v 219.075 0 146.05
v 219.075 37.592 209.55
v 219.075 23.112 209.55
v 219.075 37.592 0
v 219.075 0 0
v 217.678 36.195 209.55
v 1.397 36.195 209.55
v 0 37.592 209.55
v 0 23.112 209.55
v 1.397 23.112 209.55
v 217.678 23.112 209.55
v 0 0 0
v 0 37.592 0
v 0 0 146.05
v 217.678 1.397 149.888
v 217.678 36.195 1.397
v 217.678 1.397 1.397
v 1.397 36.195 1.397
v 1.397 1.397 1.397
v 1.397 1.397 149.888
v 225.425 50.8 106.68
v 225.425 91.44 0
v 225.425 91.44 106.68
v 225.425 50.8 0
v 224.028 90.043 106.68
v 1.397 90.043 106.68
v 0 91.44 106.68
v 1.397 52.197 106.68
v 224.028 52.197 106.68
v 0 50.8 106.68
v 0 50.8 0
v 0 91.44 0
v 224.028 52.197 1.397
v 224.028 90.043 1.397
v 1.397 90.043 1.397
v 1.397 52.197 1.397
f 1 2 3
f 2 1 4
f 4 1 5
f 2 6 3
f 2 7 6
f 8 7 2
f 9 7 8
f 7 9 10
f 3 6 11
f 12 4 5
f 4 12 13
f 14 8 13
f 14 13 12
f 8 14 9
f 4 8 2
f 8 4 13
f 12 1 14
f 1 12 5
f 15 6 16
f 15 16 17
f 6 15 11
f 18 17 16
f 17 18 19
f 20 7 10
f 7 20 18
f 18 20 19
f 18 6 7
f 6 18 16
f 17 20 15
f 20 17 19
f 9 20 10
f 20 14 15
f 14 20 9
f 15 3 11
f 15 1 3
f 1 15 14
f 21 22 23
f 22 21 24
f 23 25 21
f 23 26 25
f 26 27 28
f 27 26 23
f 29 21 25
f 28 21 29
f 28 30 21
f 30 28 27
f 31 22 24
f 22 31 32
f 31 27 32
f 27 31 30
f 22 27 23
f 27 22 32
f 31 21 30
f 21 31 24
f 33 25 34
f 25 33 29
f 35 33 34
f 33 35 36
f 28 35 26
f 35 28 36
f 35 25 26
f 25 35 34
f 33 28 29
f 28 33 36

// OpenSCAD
//
// Make a box suitable for floppy storage.

inch = 25.4; // mm
$fn = 24;

// Wall thickness is shared
wall = 0.055*inch; // 0.06
// Lid parameters
lheight = 4.2*inch;
llength = 8.875*inch;
lwidth = 1.6*inch;
// Base parameters
height = 8.25*inch;
length = 8.625*inch;
width = 1.48*inch;
rheight = 8.25*inch;
fheight = 5.75*inch;
//slack = 0.01*inch;

module box (height, length, width, wall) {
    difference () {
        cube ([length, width, height]);
        translate ([wall, wall, wall])
            cube ([length-wall*2, width-wall*2, height]);

    }
}

difference () {
    box(rheight, length, width, wall);
//    translate([0, width, height])
  //      rotate([180, 0, 0])
    //        box(lheight, length, width, wall);
    translate ([0, 0, fheight])
        rotate([70, 0, 0])
            cube([length, 2*width, lheight]);
}


module lid() {
    box(lheight, llength, lwidth, wall);
}

translate ([0, 2*inch, 0])
lid();
